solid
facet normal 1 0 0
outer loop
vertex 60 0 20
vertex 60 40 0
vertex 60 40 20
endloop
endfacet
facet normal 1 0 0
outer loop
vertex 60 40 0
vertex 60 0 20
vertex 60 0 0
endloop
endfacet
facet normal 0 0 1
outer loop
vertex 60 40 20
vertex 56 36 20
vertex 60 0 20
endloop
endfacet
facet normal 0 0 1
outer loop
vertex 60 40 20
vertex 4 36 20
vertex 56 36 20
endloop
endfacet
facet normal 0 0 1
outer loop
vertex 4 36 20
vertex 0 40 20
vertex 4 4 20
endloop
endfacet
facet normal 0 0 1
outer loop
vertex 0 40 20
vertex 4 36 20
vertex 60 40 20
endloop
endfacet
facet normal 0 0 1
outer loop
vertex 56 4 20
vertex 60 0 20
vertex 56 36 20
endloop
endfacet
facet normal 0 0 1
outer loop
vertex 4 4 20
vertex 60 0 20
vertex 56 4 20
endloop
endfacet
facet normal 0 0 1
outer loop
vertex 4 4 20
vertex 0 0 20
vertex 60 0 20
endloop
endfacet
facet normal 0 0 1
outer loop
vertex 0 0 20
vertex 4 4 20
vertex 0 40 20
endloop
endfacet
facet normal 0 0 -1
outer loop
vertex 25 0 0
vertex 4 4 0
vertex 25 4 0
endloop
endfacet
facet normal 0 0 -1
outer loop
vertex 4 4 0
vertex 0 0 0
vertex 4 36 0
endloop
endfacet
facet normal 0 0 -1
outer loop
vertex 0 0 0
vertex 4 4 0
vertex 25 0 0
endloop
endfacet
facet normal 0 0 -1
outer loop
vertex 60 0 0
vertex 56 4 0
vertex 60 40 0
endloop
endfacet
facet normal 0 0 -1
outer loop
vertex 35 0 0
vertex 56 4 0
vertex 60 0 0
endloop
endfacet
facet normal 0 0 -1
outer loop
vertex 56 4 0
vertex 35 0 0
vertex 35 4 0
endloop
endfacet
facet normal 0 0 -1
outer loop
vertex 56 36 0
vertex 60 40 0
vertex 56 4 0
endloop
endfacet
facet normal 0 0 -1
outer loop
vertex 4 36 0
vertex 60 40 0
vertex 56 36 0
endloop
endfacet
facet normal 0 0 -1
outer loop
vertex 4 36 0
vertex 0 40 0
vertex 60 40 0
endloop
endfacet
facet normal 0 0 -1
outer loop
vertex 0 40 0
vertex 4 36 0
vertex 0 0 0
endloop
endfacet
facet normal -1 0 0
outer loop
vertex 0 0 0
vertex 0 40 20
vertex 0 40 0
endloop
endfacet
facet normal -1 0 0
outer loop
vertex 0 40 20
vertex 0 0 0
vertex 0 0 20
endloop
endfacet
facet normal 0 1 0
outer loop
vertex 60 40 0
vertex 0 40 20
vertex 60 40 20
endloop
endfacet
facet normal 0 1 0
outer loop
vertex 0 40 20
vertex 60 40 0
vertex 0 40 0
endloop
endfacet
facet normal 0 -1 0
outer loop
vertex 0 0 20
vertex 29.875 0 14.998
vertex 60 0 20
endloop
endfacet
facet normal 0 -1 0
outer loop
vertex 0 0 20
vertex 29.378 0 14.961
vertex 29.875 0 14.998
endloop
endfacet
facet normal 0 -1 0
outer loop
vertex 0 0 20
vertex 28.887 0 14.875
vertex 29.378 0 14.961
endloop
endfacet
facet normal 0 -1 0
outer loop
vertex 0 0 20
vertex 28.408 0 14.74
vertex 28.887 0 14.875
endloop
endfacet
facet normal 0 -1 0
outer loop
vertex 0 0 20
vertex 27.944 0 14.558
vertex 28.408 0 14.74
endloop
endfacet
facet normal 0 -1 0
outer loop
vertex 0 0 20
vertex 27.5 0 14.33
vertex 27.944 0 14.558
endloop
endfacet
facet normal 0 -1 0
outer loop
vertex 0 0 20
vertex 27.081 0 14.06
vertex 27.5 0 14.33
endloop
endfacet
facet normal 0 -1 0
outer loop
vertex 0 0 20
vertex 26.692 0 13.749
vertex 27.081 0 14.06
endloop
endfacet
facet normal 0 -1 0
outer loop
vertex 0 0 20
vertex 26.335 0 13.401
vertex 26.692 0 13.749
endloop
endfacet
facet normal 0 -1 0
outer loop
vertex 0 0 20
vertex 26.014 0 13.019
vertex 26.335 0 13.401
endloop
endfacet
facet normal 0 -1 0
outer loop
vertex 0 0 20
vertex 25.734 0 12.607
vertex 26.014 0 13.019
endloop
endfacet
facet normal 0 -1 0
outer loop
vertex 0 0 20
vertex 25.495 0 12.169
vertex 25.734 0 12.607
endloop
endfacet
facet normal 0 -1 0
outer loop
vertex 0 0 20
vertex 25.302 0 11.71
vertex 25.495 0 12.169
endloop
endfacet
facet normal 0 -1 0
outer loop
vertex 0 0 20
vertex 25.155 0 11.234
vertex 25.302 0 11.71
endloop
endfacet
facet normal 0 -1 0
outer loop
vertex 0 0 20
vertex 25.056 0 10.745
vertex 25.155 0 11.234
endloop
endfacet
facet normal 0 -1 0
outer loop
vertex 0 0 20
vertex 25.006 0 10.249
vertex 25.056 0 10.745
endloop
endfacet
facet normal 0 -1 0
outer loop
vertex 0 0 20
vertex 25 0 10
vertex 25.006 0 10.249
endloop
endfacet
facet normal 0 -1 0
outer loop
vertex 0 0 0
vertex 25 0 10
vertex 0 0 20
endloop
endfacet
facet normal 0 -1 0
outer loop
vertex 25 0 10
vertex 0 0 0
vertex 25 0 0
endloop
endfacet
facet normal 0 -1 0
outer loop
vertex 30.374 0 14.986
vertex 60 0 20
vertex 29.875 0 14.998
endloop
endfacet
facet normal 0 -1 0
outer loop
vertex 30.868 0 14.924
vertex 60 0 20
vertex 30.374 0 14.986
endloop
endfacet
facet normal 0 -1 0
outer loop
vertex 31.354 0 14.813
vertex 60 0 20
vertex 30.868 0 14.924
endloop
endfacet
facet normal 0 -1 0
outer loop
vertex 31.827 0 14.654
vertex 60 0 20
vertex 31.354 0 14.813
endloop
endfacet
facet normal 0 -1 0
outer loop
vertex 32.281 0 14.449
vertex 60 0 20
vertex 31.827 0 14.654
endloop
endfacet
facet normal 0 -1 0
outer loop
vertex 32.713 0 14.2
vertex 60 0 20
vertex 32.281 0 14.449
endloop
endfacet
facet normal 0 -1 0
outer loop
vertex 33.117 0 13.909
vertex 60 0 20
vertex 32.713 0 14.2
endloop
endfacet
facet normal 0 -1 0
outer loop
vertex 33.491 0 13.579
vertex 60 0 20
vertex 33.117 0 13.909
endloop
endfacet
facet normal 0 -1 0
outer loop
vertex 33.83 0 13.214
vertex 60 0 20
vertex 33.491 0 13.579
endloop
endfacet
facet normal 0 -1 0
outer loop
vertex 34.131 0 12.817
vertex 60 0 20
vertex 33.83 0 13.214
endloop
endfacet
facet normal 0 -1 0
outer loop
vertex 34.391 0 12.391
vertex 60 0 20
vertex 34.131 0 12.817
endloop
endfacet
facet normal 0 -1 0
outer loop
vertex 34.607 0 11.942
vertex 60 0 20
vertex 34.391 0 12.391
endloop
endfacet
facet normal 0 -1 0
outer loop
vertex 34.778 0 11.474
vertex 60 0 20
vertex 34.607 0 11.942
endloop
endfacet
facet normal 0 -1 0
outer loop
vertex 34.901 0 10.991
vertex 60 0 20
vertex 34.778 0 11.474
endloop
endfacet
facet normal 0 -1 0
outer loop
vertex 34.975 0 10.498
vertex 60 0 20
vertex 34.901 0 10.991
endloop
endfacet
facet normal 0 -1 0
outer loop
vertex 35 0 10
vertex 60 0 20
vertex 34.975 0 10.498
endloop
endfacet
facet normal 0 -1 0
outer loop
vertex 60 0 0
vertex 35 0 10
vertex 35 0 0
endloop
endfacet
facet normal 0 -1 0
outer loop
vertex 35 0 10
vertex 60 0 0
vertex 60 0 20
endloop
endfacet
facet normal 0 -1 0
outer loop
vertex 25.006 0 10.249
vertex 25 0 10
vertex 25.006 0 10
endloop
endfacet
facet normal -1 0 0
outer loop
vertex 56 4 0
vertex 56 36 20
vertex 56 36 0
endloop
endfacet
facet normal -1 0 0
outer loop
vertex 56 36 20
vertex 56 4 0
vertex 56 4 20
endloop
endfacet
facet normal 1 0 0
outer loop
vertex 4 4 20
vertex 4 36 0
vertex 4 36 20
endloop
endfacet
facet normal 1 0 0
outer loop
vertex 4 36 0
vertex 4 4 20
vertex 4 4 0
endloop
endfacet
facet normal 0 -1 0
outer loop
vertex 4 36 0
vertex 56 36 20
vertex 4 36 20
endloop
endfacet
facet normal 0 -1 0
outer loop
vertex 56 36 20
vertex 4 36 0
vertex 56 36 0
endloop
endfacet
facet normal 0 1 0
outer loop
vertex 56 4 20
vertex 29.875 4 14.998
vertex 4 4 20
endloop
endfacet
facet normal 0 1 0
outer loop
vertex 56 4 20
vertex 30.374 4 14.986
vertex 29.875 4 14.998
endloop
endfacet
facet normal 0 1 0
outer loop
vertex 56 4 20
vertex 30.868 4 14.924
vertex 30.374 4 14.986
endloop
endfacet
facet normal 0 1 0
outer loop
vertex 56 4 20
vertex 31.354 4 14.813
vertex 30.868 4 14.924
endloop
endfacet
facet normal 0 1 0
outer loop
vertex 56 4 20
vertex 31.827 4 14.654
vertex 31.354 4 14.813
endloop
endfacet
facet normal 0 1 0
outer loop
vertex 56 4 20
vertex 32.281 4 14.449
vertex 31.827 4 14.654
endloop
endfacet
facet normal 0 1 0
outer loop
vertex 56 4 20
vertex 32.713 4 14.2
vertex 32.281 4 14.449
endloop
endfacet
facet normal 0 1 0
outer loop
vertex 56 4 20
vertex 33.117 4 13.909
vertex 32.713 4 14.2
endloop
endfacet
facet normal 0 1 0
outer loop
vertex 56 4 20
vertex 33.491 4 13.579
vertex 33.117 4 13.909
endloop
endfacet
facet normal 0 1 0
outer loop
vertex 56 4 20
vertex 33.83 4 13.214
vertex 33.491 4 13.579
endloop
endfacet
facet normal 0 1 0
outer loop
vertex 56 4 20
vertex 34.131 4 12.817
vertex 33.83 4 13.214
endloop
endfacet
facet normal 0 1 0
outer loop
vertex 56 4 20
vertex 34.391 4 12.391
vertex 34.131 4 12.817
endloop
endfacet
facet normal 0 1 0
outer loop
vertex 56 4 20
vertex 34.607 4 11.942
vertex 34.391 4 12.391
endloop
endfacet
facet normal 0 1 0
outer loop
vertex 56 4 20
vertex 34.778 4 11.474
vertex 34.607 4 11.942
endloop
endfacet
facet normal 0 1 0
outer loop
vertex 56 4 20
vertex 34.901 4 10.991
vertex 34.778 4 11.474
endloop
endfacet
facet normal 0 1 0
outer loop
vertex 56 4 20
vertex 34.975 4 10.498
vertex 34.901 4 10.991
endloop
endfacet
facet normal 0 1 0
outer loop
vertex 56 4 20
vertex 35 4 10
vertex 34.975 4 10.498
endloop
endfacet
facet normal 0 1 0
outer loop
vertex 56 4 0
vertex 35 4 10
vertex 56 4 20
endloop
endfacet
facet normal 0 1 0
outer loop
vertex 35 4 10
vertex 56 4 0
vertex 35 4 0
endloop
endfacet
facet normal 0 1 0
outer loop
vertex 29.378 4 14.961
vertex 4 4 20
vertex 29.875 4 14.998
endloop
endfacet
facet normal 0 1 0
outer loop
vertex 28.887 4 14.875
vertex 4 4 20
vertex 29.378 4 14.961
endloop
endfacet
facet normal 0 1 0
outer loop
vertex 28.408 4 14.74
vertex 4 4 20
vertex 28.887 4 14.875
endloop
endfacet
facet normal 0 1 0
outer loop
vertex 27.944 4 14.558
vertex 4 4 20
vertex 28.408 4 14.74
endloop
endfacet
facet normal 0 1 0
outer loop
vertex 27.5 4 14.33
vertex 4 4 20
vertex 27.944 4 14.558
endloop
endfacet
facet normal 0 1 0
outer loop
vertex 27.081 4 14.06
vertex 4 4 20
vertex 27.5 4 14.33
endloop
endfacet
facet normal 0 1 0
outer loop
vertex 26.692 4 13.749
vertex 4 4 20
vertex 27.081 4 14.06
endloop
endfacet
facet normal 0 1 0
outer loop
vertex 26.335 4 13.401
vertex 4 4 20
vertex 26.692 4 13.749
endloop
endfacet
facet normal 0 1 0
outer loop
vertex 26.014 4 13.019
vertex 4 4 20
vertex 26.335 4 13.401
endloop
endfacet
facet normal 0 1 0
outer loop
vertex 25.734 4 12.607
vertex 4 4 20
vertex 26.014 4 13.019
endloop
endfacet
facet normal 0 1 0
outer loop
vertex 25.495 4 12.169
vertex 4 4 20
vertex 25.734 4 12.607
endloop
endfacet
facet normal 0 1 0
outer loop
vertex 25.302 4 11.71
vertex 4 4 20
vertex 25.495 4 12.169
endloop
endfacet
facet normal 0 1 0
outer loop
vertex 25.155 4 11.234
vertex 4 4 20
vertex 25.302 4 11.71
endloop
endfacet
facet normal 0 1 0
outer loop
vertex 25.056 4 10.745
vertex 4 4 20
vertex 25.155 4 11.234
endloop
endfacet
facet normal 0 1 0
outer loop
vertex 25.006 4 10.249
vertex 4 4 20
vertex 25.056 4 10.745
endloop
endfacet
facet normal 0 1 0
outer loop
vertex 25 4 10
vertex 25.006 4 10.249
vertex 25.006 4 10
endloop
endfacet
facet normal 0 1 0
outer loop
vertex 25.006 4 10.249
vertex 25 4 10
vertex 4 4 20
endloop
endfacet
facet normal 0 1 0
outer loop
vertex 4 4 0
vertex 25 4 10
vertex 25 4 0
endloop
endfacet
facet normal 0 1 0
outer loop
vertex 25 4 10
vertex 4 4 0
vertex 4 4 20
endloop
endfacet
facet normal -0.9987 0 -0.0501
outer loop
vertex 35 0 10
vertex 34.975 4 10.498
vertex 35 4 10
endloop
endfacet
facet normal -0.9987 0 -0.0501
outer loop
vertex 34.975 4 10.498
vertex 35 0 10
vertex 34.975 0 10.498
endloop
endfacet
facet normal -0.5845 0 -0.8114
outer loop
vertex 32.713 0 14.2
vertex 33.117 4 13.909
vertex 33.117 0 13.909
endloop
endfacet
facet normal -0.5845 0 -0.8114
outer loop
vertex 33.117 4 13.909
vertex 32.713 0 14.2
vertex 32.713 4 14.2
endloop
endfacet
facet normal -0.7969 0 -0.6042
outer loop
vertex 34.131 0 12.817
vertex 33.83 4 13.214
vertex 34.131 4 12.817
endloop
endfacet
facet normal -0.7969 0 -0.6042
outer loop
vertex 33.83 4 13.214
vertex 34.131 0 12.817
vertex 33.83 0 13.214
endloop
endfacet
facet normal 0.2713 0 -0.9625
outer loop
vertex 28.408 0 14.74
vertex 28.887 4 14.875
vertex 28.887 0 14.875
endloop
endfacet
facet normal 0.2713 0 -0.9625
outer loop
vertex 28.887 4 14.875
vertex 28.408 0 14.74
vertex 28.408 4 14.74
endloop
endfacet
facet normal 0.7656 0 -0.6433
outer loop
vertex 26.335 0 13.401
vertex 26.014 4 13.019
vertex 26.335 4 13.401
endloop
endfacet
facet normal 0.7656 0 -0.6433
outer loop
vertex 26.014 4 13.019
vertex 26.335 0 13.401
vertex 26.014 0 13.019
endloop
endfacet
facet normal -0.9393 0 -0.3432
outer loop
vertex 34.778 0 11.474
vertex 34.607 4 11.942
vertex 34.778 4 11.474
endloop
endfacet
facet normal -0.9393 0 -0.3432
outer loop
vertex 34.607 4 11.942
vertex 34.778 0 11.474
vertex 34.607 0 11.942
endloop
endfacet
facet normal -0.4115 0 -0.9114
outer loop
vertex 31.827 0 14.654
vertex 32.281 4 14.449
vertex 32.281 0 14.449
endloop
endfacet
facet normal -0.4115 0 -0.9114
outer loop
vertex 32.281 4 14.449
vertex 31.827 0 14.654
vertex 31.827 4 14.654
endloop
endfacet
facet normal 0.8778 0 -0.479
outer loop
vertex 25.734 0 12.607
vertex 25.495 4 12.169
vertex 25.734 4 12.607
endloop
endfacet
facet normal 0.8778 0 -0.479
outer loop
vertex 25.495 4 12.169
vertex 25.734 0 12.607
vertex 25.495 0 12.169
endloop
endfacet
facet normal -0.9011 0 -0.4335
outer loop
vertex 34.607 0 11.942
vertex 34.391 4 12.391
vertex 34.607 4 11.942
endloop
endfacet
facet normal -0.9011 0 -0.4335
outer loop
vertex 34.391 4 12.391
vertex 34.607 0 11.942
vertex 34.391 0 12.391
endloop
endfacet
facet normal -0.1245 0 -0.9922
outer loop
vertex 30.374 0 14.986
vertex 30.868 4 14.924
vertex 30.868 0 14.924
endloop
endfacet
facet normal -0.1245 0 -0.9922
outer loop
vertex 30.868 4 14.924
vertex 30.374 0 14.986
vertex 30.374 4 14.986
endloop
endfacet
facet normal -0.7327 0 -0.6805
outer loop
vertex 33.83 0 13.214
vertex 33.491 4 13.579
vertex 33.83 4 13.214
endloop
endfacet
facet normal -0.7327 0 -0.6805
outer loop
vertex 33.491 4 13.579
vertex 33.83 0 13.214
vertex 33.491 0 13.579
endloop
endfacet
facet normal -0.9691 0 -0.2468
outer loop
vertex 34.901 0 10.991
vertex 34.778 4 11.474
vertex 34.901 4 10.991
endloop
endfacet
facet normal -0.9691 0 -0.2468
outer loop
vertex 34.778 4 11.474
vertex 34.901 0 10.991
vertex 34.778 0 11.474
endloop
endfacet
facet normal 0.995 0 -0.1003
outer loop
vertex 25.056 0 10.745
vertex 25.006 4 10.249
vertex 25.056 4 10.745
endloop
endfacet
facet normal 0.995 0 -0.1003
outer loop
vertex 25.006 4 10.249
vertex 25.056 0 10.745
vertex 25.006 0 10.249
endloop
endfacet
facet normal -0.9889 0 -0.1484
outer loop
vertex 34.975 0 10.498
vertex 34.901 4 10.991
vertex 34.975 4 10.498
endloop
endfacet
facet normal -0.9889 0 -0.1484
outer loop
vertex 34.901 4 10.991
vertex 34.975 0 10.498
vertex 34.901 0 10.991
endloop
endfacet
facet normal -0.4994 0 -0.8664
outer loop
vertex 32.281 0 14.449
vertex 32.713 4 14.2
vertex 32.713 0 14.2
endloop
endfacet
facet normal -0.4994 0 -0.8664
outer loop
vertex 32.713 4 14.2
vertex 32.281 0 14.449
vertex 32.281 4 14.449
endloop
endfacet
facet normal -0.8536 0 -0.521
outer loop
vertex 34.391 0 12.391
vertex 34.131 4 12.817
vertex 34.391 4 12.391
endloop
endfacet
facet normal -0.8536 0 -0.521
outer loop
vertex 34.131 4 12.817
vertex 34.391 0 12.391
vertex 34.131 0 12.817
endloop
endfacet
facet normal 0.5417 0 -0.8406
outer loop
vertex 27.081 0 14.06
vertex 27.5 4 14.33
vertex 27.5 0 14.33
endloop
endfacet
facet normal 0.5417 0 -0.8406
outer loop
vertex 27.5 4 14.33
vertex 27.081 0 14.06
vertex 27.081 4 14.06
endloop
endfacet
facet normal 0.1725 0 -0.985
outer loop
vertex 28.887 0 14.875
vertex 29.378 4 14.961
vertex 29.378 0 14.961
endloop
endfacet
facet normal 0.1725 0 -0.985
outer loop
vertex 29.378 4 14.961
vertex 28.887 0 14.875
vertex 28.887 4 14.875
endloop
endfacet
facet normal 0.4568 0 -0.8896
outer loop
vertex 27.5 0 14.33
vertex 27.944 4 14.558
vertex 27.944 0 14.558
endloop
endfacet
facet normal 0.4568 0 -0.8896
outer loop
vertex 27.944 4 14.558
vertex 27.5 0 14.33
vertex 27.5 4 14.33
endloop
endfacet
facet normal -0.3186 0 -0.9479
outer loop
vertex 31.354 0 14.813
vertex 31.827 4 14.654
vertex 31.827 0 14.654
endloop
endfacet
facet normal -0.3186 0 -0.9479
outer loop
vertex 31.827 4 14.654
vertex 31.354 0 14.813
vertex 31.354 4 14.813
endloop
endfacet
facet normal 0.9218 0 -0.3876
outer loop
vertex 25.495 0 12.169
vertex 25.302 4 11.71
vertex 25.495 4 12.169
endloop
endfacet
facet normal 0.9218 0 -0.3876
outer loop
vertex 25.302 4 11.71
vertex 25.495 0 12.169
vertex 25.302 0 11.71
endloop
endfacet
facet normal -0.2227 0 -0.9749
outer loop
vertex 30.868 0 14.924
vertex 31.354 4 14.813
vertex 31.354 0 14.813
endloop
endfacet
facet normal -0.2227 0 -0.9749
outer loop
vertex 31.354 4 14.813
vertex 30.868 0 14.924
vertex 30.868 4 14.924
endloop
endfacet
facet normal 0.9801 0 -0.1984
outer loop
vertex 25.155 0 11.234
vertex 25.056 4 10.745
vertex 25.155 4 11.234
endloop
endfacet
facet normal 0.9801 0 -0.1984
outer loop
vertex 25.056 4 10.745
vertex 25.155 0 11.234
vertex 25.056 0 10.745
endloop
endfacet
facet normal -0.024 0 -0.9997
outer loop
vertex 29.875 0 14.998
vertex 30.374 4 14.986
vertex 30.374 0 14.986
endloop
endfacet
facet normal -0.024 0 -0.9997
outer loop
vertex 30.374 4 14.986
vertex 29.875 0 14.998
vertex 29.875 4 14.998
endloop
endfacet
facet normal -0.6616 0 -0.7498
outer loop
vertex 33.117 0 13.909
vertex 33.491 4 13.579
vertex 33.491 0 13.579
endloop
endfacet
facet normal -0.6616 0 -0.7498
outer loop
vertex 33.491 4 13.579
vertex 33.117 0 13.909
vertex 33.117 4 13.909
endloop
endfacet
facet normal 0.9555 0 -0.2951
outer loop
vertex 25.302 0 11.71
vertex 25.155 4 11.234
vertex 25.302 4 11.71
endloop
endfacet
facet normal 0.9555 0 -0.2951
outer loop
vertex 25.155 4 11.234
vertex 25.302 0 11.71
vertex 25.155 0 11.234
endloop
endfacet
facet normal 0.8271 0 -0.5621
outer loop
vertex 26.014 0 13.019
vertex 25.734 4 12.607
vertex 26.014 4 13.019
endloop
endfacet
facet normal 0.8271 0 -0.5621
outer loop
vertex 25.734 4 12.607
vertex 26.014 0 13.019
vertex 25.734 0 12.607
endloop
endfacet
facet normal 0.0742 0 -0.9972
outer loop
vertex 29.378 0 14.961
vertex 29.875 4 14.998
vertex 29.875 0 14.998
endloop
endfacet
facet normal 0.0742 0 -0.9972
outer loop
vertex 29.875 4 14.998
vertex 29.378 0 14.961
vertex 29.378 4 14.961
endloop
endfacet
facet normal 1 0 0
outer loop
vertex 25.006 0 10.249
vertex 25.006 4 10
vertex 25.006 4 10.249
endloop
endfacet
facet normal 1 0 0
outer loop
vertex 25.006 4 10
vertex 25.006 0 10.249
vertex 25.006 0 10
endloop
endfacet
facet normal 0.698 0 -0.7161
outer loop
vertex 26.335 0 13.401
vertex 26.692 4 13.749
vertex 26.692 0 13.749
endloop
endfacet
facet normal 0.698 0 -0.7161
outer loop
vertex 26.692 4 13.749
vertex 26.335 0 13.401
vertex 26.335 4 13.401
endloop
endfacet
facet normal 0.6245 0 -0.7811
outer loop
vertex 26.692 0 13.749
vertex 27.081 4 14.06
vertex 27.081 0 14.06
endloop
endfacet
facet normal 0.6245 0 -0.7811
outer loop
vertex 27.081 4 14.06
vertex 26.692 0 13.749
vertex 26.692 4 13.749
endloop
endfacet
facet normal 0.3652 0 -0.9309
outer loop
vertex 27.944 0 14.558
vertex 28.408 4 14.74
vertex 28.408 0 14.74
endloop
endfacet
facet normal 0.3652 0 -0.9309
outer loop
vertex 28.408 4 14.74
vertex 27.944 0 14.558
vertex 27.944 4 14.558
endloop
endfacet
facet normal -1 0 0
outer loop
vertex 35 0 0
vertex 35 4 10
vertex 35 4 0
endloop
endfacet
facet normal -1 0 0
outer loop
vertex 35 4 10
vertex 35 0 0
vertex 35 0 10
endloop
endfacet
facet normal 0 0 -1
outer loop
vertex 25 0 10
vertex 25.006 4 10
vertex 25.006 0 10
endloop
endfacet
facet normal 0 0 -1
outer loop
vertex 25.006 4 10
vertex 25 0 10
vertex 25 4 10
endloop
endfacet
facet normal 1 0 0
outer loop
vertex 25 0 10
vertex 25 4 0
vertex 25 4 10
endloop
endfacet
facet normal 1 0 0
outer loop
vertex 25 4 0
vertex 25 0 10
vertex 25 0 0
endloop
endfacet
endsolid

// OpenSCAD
// vim:ts=4:sw=4:sts=4:et:ai:si:fdm=marker

// Resolution
$fn = 0;   // fixed number of fragments
$fs = 0.5; // minimum fragment size (linear)
$fa = 3;   // minimum fragment angle (angular)

// variables
x = 60;
y = 40;
z = 20;
th = 1;
walls = 4;
door = 10;
door_height = y/4;
font = ".New York";

render(convexity=4) {
    difference() {
        cube([x,y,z]);
        translate([walls,walls,0]) {
            cube([x-walls*2,y-walls*2,z]);
        }
        translate([x/2,0,door_height]) {
            rotate([270,0,0]) {
                cylinder(h=walls, d=door);
            }
        }
        translate([x/2-door/2,0,0]) {
            cube([door,walls,door_height]);
        }
    }
}
